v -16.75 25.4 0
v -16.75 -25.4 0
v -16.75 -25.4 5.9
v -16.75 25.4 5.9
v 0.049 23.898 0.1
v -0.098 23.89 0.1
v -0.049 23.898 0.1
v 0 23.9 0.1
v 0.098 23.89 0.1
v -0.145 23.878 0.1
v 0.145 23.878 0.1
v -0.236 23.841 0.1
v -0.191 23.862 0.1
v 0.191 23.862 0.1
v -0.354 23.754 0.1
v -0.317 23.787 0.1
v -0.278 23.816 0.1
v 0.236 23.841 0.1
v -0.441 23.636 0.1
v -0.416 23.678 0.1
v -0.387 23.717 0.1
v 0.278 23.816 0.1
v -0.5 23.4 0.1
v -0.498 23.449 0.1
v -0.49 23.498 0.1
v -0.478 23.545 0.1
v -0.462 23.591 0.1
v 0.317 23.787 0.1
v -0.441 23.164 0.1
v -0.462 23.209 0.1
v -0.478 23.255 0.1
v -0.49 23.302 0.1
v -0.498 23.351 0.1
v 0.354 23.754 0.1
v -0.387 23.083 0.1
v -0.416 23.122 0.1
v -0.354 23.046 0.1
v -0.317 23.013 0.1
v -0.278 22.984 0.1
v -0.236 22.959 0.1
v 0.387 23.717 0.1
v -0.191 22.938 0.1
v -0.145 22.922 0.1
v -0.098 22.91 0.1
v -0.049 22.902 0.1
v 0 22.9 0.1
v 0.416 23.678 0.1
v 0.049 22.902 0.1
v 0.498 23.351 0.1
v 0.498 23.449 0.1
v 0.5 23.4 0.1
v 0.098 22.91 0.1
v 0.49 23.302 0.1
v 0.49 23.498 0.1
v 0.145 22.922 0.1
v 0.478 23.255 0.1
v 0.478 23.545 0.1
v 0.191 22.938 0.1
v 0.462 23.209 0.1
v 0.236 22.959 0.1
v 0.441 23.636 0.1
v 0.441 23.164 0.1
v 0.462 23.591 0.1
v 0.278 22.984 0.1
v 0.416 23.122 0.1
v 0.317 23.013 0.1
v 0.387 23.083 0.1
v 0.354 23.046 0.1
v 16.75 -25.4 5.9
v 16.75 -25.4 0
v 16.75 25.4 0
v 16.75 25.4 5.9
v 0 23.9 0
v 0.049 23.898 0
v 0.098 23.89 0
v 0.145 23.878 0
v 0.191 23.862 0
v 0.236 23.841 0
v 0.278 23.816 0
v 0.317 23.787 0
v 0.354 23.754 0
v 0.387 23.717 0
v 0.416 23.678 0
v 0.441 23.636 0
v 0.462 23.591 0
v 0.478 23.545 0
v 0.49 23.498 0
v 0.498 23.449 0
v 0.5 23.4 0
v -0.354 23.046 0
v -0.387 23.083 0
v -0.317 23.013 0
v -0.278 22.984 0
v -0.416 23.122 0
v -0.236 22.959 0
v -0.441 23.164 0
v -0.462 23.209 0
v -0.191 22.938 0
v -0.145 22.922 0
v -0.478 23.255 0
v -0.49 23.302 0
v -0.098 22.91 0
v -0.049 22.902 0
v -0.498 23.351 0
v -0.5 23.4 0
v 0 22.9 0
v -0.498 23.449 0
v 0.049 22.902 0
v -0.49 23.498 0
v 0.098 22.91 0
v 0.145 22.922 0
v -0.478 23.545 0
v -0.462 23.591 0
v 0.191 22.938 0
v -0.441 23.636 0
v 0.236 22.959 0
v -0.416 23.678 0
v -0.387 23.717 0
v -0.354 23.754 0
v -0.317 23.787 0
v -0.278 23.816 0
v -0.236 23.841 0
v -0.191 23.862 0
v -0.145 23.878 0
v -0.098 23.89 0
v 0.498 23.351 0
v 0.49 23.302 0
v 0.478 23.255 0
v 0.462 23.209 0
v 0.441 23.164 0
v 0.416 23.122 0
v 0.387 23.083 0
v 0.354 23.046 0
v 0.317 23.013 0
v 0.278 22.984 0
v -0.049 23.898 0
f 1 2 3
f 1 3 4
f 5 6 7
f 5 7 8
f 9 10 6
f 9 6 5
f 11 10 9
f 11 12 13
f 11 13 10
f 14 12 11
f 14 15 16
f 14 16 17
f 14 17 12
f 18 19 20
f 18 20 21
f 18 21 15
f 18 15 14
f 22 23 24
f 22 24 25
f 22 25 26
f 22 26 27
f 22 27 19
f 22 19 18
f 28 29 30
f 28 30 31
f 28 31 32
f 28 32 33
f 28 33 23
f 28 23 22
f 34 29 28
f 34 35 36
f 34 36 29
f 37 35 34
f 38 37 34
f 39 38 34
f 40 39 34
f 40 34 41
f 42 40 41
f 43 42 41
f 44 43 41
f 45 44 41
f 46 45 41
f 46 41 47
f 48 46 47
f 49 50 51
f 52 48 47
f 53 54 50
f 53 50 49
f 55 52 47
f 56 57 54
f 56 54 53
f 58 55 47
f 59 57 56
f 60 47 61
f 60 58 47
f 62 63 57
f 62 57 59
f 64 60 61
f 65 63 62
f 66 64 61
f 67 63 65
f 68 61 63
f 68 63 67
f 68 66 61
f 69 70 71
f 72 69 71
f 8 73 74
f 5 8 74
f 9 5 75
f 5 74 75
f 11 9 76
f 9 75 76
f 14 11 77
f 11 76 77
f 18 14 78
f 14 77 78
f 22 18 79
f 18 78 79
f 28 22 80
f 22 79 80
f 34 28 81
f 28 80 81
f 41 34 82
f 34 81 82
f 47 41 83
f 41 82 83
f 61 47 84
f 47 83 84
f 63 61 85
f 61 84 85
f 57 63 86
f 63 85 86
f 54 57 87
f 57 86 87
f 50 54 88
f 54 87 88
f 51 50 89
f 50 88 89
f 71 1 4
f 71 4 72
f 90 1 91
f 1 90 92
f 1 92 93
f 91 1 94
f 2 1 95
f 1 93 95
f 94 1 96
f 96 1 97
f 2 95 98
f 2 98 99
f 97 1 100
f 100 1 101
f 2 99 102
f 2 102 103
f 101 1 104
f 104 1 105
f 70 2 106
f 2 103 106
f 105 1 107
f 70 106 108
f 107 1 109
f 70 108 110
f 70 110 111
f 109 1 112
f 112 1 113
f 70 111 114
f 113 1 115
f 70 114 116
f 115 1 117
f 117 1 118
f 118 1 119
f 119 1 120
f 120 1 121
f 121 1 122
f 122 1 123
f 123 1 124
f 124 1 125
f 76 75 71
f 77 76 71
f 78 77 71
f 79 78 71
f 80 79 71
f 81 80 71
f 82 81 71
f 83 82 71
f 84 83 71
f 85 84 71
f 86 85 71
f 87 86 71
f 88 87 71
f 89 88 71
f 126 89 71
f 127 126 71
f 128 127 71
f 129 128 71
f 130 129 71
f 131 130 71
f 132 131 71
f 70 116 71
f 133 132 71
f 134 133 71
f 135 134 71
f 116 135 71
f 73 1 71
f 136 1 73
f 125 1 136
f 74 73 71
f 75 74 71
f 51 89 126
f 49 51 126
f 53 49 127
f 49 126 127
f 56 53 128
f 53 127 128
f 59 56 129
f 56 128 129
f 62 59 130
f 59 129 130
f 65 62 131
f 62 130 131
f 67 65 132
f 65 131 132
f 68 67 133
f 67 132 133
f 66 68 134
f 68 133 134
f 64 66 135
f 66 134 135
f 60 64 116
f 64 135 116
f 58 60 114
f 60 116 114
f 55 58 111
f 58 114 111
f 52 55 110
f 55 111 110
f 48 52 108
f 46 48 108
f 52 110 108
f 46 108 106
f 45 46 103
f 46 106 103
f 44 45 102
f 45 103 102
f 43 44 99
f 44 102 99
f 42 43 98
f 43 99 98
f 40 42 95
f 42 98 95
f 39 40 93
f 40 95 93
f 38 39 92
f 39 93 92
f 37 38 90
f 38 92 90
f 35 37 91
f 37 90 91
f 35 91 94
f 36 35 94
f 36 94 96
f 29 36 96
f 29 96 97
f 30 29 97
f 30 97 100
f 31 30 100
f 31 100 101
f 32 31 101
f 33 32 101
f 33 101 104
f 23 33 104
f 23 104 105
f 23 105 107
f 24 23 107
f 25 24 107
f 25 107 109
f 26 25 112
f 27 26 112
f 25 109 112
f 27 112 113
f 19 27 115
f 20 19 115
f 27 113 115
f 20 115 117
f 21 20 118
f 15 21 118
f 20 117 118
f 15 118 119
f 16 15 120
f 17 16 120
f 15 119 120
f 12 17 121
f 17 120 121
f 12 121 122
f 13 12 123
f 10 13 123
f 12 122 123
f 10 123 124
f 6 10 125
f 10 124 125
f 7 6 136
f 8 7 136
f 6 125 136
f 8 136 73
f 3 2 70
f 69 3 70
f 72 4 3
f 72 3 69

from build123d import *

# Parameters (mm, degrees)
F0_W     = 33.5
F0_H     = 50.8
F1_DEPTH = 5.9
F3_DEPTH = 0.1


with BuildPart() as f1:
    # F0 (on Top) → F1 (new body)
    with BuildSketch(Plane.XY):
        Rectangle(F0_W, F0_H)
    extrude(amount=F1_DEPTH)

    # F2 (on face) → F3 (cut)
    with BuildSketch(Plane(origin=(0, 0, 0), x_dir=(1, 0, 0), z_dir=(0, 0, -1))):
        with BuildLine():
            ThreePointArc((0.5, -23.4), (-0.353553, -23.046447), (0, -23.9))
            ThreePointArc((0, -23.9), (0.353553, -23.753553), (0.5, -23.4))
        make_face()
    extrude(amount=-F3_DEPTH, mode=Mode.SUBTRACT)


solid = f1.part
